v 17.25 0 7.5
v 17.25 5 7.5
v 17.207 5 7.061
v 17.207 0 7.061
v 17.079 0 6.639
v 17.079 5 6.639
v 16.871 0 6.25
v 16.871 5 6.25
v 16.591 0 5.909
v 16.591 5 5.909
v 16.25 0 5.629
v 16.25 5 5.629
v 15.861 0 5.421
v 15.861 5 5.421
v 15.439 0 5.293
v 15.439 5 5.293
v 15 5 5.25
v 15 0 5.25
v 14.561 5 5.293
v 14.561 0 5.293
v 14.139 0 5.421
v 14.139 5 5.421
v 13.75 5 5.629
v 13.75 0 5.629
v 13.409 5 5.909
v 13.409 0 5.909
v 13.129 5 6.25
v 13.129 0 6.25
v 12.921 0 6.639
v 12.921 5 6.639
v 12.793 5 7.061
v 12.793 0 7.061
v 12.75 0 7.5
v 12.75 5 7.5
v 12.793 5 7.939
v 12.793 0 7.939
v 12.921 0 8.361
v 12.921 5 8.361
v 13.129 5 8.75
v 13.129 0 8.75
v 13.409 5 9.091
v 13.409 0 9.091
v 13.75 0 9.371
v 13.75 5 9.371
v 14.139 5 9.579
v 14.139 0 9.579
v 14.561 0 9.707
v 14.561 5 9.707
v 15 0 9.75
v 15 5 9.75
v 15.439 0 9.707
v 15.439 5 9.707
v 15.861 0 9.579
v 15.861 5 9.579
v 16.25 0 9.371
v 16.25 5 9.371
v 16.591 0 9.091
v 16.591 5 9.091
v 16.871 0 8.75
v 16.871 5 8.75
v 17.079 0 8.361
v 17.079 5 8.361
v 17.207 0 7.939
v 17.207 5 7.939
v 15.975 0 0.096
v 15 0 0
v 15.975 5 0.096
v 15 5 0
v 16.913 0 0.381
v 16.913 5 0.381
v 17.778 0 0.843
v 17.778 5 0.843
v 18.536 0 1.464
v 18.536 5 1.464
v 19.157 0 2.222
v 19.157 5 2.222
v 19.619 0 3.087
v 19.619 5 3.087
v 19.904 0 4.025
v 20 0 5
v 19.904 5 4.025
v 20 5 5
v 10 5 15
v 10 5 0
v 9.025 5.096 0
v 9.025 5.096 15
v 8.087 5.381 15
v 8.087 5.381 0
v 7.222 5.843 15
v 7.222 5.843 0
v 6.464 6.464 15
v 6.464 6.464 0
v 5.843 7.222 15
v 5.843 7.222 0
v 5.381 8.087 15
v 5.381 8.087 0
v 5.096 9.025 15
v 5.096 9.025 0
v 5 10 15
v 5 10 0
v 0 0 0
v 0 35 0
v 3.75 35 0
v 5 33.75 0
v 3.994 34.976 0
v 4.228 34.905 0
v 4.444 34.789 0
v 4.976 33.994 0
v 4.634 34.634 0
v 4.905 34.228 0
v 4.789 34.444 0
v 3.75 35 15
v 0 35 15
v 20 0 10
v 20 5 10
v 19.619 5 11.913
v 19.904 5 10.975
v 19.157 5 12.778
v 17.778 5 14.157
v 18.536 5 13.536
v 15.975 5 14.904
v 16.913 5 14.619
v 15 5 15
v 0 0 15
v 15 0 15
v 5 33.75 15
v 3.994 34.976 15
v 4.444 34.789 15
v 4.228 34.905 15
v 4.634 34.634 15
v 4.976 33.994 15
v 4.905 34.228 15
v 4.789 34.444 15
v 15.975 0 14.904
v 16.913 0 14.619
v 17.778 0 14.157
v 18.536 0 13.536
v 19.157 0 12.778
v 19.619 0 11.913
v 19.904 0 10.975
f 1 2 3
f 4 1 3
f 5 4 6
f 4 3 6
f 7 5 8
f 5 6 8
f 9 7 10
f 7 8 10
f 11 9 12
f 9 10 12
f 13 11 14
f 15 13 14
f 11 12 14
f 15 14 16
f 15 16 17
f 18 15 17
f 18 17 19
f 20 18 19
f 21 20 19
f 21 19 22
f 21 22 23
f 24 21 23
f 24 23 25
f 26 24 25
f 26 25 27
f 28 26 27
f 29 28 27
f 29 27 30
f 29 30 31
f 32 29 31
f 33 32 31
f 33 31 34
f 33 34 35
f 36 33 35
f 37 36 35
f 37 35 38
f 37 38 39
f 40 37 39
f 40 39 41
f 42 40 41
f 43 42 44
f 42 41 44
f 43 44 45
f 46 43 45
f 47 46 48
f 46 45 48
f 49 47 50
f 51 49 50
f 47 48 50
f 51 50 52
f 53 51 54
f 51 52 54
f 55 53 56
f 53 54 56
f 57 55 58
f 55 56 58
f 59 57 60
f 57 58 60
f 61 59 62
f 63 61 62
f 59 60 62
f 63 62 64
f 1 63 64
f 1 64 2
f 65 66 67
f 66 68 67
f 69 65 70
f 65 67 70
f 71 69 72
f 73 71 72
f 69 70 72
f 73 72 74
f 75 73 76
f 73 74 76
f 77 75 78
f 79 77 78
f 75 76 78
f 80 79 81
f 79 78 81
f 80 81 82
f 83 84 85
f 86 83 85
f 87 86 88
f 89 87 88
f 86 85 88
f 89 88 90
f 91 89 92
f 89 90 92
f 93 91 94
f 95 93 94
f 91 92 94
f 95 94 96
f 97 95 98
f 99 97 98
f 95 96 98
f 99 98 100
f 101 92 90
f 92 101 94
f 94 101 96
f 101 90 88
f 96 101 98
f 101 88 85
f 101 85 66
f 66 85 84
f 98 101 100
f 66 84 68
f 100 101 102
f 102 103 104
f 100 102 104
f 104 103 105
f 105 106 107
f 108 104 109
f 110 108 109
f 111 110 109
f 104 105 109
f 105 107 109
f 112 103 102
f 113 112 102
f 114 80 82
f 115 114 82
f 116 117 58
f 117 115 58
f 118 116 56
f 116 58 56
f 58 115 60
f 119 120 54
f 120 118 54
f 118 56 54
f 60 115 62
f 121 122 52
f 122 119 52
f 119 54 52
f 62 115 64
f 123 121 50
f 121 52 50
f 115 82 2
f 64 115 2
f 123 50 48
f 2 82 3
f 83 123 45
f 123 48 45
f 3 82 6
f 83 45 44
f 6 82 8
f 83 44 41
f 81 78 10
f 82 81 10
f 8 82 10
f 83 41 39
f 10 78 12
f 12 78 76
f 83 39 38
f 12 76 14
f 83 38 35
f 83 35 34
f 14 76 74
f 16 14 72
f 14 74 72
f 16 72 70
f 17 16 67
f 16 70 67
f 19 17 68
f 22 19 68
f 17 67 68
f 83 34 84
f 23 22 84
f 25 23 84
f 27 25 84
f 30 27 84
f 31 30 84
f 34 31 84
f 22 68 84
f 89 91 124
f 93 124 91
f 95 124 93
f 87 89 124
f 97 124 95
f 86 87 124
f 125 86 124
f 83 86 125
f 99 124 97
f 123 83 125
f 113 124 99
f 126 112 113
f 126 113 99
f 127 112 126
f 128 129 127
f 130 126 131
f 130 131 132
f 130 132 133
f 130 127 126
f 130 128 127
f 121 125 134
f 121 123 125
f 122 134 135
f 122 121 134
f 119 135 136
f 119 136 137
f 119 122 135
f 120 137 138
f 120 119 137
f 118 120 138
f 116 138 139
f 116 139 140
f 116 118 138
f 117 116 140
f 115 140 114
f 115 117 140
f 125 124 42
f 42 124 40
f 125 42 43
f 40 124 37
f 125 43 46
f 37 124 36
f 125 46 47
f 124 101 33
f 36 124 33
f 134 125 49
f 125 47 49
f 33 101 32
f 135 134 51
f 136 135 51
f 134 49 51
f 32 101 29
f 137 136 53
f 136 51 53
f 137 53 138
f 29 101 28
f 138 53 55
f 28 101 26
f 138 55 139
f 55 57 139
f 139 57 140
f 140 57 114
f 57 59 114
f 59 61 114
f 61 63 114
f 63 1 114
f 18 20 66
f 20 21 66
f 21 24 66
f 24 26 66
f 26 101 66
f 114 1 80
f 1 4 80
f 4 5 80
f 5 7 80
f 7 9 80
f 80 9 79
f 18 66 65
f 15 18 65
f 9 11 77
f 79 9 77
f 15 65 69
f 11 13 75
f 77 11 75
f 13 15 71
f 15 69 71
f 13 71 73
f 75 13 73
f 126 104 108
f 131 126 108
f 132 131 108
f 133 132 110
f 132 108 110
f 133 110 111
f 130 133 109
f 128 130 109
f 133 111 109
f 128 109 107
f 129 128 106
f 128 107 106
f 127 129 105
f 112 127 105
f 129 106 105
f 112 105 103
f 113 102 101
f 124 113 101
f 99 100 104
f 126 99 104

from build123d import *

# Parameters (mm, degrees)
BOSS_EXTRUDE1_DEPTH = 15
CUT_EXTRUDE1_REACH  = 7
SKETCH2_R           = 2.25
FILLET1_R           = 5


with BuildPart() as part:
    # Sketch1 → Boss-Extrude1 (new body)
    with BuildSketch(Plane.XY):
        with BuildLine():
            Line((0, 35), (0, 0))
            Line((0, 0), (20, 0))
            Line((20, 0), (20, 5))
            Line((20, 5), (10, 5))
            ThreePointArc((10, 5), (6.464466094, 6.464466094), (5, 10))
            Line((5, 10), (5, 33.75))
            ThreePointArc((5, 33.75), (4.633883476, 34.633883476), (3.75, 35))
            Line((3.75, 35), (0, 35))
        make_face()
    extrude(amount=BOSS_EXTRUDE1_DEPTH)

    # Sketch2 → Cut-Extrude1 (cut, up to next)
    with BuildSketch(Plane(origin=(0, 5, 0), x_dir=(1, 0, 0), z_dir=(0, 1, 0)), mode=Mode.PRIVATE) as cut_extrude1_sk1:
        with Locations((15, -7.5)):
            Circle(SKETCH2_R)
    cut_extrude1_tool1 = extrude(cut_extrude1_sk1.sketch, amount=-CUT_EXTRUDE1_REACH, mode=Mode.PRIVATE) & part.part
    add(cut_extrude1_tool1.solids().sort_by_distance((15, 5, 7.5))[0], mode=Mode.SUBTRACT)

    # Fillet1
    fillet1_edges = [part.edges().sort_by_distance(p)[0] for p in [
        (20, 2.5, 15),
        (20, 2.5, 0),
    ]]
    fillet(fillet1_edges, radius=FILLET1_R)


solid = part.part
